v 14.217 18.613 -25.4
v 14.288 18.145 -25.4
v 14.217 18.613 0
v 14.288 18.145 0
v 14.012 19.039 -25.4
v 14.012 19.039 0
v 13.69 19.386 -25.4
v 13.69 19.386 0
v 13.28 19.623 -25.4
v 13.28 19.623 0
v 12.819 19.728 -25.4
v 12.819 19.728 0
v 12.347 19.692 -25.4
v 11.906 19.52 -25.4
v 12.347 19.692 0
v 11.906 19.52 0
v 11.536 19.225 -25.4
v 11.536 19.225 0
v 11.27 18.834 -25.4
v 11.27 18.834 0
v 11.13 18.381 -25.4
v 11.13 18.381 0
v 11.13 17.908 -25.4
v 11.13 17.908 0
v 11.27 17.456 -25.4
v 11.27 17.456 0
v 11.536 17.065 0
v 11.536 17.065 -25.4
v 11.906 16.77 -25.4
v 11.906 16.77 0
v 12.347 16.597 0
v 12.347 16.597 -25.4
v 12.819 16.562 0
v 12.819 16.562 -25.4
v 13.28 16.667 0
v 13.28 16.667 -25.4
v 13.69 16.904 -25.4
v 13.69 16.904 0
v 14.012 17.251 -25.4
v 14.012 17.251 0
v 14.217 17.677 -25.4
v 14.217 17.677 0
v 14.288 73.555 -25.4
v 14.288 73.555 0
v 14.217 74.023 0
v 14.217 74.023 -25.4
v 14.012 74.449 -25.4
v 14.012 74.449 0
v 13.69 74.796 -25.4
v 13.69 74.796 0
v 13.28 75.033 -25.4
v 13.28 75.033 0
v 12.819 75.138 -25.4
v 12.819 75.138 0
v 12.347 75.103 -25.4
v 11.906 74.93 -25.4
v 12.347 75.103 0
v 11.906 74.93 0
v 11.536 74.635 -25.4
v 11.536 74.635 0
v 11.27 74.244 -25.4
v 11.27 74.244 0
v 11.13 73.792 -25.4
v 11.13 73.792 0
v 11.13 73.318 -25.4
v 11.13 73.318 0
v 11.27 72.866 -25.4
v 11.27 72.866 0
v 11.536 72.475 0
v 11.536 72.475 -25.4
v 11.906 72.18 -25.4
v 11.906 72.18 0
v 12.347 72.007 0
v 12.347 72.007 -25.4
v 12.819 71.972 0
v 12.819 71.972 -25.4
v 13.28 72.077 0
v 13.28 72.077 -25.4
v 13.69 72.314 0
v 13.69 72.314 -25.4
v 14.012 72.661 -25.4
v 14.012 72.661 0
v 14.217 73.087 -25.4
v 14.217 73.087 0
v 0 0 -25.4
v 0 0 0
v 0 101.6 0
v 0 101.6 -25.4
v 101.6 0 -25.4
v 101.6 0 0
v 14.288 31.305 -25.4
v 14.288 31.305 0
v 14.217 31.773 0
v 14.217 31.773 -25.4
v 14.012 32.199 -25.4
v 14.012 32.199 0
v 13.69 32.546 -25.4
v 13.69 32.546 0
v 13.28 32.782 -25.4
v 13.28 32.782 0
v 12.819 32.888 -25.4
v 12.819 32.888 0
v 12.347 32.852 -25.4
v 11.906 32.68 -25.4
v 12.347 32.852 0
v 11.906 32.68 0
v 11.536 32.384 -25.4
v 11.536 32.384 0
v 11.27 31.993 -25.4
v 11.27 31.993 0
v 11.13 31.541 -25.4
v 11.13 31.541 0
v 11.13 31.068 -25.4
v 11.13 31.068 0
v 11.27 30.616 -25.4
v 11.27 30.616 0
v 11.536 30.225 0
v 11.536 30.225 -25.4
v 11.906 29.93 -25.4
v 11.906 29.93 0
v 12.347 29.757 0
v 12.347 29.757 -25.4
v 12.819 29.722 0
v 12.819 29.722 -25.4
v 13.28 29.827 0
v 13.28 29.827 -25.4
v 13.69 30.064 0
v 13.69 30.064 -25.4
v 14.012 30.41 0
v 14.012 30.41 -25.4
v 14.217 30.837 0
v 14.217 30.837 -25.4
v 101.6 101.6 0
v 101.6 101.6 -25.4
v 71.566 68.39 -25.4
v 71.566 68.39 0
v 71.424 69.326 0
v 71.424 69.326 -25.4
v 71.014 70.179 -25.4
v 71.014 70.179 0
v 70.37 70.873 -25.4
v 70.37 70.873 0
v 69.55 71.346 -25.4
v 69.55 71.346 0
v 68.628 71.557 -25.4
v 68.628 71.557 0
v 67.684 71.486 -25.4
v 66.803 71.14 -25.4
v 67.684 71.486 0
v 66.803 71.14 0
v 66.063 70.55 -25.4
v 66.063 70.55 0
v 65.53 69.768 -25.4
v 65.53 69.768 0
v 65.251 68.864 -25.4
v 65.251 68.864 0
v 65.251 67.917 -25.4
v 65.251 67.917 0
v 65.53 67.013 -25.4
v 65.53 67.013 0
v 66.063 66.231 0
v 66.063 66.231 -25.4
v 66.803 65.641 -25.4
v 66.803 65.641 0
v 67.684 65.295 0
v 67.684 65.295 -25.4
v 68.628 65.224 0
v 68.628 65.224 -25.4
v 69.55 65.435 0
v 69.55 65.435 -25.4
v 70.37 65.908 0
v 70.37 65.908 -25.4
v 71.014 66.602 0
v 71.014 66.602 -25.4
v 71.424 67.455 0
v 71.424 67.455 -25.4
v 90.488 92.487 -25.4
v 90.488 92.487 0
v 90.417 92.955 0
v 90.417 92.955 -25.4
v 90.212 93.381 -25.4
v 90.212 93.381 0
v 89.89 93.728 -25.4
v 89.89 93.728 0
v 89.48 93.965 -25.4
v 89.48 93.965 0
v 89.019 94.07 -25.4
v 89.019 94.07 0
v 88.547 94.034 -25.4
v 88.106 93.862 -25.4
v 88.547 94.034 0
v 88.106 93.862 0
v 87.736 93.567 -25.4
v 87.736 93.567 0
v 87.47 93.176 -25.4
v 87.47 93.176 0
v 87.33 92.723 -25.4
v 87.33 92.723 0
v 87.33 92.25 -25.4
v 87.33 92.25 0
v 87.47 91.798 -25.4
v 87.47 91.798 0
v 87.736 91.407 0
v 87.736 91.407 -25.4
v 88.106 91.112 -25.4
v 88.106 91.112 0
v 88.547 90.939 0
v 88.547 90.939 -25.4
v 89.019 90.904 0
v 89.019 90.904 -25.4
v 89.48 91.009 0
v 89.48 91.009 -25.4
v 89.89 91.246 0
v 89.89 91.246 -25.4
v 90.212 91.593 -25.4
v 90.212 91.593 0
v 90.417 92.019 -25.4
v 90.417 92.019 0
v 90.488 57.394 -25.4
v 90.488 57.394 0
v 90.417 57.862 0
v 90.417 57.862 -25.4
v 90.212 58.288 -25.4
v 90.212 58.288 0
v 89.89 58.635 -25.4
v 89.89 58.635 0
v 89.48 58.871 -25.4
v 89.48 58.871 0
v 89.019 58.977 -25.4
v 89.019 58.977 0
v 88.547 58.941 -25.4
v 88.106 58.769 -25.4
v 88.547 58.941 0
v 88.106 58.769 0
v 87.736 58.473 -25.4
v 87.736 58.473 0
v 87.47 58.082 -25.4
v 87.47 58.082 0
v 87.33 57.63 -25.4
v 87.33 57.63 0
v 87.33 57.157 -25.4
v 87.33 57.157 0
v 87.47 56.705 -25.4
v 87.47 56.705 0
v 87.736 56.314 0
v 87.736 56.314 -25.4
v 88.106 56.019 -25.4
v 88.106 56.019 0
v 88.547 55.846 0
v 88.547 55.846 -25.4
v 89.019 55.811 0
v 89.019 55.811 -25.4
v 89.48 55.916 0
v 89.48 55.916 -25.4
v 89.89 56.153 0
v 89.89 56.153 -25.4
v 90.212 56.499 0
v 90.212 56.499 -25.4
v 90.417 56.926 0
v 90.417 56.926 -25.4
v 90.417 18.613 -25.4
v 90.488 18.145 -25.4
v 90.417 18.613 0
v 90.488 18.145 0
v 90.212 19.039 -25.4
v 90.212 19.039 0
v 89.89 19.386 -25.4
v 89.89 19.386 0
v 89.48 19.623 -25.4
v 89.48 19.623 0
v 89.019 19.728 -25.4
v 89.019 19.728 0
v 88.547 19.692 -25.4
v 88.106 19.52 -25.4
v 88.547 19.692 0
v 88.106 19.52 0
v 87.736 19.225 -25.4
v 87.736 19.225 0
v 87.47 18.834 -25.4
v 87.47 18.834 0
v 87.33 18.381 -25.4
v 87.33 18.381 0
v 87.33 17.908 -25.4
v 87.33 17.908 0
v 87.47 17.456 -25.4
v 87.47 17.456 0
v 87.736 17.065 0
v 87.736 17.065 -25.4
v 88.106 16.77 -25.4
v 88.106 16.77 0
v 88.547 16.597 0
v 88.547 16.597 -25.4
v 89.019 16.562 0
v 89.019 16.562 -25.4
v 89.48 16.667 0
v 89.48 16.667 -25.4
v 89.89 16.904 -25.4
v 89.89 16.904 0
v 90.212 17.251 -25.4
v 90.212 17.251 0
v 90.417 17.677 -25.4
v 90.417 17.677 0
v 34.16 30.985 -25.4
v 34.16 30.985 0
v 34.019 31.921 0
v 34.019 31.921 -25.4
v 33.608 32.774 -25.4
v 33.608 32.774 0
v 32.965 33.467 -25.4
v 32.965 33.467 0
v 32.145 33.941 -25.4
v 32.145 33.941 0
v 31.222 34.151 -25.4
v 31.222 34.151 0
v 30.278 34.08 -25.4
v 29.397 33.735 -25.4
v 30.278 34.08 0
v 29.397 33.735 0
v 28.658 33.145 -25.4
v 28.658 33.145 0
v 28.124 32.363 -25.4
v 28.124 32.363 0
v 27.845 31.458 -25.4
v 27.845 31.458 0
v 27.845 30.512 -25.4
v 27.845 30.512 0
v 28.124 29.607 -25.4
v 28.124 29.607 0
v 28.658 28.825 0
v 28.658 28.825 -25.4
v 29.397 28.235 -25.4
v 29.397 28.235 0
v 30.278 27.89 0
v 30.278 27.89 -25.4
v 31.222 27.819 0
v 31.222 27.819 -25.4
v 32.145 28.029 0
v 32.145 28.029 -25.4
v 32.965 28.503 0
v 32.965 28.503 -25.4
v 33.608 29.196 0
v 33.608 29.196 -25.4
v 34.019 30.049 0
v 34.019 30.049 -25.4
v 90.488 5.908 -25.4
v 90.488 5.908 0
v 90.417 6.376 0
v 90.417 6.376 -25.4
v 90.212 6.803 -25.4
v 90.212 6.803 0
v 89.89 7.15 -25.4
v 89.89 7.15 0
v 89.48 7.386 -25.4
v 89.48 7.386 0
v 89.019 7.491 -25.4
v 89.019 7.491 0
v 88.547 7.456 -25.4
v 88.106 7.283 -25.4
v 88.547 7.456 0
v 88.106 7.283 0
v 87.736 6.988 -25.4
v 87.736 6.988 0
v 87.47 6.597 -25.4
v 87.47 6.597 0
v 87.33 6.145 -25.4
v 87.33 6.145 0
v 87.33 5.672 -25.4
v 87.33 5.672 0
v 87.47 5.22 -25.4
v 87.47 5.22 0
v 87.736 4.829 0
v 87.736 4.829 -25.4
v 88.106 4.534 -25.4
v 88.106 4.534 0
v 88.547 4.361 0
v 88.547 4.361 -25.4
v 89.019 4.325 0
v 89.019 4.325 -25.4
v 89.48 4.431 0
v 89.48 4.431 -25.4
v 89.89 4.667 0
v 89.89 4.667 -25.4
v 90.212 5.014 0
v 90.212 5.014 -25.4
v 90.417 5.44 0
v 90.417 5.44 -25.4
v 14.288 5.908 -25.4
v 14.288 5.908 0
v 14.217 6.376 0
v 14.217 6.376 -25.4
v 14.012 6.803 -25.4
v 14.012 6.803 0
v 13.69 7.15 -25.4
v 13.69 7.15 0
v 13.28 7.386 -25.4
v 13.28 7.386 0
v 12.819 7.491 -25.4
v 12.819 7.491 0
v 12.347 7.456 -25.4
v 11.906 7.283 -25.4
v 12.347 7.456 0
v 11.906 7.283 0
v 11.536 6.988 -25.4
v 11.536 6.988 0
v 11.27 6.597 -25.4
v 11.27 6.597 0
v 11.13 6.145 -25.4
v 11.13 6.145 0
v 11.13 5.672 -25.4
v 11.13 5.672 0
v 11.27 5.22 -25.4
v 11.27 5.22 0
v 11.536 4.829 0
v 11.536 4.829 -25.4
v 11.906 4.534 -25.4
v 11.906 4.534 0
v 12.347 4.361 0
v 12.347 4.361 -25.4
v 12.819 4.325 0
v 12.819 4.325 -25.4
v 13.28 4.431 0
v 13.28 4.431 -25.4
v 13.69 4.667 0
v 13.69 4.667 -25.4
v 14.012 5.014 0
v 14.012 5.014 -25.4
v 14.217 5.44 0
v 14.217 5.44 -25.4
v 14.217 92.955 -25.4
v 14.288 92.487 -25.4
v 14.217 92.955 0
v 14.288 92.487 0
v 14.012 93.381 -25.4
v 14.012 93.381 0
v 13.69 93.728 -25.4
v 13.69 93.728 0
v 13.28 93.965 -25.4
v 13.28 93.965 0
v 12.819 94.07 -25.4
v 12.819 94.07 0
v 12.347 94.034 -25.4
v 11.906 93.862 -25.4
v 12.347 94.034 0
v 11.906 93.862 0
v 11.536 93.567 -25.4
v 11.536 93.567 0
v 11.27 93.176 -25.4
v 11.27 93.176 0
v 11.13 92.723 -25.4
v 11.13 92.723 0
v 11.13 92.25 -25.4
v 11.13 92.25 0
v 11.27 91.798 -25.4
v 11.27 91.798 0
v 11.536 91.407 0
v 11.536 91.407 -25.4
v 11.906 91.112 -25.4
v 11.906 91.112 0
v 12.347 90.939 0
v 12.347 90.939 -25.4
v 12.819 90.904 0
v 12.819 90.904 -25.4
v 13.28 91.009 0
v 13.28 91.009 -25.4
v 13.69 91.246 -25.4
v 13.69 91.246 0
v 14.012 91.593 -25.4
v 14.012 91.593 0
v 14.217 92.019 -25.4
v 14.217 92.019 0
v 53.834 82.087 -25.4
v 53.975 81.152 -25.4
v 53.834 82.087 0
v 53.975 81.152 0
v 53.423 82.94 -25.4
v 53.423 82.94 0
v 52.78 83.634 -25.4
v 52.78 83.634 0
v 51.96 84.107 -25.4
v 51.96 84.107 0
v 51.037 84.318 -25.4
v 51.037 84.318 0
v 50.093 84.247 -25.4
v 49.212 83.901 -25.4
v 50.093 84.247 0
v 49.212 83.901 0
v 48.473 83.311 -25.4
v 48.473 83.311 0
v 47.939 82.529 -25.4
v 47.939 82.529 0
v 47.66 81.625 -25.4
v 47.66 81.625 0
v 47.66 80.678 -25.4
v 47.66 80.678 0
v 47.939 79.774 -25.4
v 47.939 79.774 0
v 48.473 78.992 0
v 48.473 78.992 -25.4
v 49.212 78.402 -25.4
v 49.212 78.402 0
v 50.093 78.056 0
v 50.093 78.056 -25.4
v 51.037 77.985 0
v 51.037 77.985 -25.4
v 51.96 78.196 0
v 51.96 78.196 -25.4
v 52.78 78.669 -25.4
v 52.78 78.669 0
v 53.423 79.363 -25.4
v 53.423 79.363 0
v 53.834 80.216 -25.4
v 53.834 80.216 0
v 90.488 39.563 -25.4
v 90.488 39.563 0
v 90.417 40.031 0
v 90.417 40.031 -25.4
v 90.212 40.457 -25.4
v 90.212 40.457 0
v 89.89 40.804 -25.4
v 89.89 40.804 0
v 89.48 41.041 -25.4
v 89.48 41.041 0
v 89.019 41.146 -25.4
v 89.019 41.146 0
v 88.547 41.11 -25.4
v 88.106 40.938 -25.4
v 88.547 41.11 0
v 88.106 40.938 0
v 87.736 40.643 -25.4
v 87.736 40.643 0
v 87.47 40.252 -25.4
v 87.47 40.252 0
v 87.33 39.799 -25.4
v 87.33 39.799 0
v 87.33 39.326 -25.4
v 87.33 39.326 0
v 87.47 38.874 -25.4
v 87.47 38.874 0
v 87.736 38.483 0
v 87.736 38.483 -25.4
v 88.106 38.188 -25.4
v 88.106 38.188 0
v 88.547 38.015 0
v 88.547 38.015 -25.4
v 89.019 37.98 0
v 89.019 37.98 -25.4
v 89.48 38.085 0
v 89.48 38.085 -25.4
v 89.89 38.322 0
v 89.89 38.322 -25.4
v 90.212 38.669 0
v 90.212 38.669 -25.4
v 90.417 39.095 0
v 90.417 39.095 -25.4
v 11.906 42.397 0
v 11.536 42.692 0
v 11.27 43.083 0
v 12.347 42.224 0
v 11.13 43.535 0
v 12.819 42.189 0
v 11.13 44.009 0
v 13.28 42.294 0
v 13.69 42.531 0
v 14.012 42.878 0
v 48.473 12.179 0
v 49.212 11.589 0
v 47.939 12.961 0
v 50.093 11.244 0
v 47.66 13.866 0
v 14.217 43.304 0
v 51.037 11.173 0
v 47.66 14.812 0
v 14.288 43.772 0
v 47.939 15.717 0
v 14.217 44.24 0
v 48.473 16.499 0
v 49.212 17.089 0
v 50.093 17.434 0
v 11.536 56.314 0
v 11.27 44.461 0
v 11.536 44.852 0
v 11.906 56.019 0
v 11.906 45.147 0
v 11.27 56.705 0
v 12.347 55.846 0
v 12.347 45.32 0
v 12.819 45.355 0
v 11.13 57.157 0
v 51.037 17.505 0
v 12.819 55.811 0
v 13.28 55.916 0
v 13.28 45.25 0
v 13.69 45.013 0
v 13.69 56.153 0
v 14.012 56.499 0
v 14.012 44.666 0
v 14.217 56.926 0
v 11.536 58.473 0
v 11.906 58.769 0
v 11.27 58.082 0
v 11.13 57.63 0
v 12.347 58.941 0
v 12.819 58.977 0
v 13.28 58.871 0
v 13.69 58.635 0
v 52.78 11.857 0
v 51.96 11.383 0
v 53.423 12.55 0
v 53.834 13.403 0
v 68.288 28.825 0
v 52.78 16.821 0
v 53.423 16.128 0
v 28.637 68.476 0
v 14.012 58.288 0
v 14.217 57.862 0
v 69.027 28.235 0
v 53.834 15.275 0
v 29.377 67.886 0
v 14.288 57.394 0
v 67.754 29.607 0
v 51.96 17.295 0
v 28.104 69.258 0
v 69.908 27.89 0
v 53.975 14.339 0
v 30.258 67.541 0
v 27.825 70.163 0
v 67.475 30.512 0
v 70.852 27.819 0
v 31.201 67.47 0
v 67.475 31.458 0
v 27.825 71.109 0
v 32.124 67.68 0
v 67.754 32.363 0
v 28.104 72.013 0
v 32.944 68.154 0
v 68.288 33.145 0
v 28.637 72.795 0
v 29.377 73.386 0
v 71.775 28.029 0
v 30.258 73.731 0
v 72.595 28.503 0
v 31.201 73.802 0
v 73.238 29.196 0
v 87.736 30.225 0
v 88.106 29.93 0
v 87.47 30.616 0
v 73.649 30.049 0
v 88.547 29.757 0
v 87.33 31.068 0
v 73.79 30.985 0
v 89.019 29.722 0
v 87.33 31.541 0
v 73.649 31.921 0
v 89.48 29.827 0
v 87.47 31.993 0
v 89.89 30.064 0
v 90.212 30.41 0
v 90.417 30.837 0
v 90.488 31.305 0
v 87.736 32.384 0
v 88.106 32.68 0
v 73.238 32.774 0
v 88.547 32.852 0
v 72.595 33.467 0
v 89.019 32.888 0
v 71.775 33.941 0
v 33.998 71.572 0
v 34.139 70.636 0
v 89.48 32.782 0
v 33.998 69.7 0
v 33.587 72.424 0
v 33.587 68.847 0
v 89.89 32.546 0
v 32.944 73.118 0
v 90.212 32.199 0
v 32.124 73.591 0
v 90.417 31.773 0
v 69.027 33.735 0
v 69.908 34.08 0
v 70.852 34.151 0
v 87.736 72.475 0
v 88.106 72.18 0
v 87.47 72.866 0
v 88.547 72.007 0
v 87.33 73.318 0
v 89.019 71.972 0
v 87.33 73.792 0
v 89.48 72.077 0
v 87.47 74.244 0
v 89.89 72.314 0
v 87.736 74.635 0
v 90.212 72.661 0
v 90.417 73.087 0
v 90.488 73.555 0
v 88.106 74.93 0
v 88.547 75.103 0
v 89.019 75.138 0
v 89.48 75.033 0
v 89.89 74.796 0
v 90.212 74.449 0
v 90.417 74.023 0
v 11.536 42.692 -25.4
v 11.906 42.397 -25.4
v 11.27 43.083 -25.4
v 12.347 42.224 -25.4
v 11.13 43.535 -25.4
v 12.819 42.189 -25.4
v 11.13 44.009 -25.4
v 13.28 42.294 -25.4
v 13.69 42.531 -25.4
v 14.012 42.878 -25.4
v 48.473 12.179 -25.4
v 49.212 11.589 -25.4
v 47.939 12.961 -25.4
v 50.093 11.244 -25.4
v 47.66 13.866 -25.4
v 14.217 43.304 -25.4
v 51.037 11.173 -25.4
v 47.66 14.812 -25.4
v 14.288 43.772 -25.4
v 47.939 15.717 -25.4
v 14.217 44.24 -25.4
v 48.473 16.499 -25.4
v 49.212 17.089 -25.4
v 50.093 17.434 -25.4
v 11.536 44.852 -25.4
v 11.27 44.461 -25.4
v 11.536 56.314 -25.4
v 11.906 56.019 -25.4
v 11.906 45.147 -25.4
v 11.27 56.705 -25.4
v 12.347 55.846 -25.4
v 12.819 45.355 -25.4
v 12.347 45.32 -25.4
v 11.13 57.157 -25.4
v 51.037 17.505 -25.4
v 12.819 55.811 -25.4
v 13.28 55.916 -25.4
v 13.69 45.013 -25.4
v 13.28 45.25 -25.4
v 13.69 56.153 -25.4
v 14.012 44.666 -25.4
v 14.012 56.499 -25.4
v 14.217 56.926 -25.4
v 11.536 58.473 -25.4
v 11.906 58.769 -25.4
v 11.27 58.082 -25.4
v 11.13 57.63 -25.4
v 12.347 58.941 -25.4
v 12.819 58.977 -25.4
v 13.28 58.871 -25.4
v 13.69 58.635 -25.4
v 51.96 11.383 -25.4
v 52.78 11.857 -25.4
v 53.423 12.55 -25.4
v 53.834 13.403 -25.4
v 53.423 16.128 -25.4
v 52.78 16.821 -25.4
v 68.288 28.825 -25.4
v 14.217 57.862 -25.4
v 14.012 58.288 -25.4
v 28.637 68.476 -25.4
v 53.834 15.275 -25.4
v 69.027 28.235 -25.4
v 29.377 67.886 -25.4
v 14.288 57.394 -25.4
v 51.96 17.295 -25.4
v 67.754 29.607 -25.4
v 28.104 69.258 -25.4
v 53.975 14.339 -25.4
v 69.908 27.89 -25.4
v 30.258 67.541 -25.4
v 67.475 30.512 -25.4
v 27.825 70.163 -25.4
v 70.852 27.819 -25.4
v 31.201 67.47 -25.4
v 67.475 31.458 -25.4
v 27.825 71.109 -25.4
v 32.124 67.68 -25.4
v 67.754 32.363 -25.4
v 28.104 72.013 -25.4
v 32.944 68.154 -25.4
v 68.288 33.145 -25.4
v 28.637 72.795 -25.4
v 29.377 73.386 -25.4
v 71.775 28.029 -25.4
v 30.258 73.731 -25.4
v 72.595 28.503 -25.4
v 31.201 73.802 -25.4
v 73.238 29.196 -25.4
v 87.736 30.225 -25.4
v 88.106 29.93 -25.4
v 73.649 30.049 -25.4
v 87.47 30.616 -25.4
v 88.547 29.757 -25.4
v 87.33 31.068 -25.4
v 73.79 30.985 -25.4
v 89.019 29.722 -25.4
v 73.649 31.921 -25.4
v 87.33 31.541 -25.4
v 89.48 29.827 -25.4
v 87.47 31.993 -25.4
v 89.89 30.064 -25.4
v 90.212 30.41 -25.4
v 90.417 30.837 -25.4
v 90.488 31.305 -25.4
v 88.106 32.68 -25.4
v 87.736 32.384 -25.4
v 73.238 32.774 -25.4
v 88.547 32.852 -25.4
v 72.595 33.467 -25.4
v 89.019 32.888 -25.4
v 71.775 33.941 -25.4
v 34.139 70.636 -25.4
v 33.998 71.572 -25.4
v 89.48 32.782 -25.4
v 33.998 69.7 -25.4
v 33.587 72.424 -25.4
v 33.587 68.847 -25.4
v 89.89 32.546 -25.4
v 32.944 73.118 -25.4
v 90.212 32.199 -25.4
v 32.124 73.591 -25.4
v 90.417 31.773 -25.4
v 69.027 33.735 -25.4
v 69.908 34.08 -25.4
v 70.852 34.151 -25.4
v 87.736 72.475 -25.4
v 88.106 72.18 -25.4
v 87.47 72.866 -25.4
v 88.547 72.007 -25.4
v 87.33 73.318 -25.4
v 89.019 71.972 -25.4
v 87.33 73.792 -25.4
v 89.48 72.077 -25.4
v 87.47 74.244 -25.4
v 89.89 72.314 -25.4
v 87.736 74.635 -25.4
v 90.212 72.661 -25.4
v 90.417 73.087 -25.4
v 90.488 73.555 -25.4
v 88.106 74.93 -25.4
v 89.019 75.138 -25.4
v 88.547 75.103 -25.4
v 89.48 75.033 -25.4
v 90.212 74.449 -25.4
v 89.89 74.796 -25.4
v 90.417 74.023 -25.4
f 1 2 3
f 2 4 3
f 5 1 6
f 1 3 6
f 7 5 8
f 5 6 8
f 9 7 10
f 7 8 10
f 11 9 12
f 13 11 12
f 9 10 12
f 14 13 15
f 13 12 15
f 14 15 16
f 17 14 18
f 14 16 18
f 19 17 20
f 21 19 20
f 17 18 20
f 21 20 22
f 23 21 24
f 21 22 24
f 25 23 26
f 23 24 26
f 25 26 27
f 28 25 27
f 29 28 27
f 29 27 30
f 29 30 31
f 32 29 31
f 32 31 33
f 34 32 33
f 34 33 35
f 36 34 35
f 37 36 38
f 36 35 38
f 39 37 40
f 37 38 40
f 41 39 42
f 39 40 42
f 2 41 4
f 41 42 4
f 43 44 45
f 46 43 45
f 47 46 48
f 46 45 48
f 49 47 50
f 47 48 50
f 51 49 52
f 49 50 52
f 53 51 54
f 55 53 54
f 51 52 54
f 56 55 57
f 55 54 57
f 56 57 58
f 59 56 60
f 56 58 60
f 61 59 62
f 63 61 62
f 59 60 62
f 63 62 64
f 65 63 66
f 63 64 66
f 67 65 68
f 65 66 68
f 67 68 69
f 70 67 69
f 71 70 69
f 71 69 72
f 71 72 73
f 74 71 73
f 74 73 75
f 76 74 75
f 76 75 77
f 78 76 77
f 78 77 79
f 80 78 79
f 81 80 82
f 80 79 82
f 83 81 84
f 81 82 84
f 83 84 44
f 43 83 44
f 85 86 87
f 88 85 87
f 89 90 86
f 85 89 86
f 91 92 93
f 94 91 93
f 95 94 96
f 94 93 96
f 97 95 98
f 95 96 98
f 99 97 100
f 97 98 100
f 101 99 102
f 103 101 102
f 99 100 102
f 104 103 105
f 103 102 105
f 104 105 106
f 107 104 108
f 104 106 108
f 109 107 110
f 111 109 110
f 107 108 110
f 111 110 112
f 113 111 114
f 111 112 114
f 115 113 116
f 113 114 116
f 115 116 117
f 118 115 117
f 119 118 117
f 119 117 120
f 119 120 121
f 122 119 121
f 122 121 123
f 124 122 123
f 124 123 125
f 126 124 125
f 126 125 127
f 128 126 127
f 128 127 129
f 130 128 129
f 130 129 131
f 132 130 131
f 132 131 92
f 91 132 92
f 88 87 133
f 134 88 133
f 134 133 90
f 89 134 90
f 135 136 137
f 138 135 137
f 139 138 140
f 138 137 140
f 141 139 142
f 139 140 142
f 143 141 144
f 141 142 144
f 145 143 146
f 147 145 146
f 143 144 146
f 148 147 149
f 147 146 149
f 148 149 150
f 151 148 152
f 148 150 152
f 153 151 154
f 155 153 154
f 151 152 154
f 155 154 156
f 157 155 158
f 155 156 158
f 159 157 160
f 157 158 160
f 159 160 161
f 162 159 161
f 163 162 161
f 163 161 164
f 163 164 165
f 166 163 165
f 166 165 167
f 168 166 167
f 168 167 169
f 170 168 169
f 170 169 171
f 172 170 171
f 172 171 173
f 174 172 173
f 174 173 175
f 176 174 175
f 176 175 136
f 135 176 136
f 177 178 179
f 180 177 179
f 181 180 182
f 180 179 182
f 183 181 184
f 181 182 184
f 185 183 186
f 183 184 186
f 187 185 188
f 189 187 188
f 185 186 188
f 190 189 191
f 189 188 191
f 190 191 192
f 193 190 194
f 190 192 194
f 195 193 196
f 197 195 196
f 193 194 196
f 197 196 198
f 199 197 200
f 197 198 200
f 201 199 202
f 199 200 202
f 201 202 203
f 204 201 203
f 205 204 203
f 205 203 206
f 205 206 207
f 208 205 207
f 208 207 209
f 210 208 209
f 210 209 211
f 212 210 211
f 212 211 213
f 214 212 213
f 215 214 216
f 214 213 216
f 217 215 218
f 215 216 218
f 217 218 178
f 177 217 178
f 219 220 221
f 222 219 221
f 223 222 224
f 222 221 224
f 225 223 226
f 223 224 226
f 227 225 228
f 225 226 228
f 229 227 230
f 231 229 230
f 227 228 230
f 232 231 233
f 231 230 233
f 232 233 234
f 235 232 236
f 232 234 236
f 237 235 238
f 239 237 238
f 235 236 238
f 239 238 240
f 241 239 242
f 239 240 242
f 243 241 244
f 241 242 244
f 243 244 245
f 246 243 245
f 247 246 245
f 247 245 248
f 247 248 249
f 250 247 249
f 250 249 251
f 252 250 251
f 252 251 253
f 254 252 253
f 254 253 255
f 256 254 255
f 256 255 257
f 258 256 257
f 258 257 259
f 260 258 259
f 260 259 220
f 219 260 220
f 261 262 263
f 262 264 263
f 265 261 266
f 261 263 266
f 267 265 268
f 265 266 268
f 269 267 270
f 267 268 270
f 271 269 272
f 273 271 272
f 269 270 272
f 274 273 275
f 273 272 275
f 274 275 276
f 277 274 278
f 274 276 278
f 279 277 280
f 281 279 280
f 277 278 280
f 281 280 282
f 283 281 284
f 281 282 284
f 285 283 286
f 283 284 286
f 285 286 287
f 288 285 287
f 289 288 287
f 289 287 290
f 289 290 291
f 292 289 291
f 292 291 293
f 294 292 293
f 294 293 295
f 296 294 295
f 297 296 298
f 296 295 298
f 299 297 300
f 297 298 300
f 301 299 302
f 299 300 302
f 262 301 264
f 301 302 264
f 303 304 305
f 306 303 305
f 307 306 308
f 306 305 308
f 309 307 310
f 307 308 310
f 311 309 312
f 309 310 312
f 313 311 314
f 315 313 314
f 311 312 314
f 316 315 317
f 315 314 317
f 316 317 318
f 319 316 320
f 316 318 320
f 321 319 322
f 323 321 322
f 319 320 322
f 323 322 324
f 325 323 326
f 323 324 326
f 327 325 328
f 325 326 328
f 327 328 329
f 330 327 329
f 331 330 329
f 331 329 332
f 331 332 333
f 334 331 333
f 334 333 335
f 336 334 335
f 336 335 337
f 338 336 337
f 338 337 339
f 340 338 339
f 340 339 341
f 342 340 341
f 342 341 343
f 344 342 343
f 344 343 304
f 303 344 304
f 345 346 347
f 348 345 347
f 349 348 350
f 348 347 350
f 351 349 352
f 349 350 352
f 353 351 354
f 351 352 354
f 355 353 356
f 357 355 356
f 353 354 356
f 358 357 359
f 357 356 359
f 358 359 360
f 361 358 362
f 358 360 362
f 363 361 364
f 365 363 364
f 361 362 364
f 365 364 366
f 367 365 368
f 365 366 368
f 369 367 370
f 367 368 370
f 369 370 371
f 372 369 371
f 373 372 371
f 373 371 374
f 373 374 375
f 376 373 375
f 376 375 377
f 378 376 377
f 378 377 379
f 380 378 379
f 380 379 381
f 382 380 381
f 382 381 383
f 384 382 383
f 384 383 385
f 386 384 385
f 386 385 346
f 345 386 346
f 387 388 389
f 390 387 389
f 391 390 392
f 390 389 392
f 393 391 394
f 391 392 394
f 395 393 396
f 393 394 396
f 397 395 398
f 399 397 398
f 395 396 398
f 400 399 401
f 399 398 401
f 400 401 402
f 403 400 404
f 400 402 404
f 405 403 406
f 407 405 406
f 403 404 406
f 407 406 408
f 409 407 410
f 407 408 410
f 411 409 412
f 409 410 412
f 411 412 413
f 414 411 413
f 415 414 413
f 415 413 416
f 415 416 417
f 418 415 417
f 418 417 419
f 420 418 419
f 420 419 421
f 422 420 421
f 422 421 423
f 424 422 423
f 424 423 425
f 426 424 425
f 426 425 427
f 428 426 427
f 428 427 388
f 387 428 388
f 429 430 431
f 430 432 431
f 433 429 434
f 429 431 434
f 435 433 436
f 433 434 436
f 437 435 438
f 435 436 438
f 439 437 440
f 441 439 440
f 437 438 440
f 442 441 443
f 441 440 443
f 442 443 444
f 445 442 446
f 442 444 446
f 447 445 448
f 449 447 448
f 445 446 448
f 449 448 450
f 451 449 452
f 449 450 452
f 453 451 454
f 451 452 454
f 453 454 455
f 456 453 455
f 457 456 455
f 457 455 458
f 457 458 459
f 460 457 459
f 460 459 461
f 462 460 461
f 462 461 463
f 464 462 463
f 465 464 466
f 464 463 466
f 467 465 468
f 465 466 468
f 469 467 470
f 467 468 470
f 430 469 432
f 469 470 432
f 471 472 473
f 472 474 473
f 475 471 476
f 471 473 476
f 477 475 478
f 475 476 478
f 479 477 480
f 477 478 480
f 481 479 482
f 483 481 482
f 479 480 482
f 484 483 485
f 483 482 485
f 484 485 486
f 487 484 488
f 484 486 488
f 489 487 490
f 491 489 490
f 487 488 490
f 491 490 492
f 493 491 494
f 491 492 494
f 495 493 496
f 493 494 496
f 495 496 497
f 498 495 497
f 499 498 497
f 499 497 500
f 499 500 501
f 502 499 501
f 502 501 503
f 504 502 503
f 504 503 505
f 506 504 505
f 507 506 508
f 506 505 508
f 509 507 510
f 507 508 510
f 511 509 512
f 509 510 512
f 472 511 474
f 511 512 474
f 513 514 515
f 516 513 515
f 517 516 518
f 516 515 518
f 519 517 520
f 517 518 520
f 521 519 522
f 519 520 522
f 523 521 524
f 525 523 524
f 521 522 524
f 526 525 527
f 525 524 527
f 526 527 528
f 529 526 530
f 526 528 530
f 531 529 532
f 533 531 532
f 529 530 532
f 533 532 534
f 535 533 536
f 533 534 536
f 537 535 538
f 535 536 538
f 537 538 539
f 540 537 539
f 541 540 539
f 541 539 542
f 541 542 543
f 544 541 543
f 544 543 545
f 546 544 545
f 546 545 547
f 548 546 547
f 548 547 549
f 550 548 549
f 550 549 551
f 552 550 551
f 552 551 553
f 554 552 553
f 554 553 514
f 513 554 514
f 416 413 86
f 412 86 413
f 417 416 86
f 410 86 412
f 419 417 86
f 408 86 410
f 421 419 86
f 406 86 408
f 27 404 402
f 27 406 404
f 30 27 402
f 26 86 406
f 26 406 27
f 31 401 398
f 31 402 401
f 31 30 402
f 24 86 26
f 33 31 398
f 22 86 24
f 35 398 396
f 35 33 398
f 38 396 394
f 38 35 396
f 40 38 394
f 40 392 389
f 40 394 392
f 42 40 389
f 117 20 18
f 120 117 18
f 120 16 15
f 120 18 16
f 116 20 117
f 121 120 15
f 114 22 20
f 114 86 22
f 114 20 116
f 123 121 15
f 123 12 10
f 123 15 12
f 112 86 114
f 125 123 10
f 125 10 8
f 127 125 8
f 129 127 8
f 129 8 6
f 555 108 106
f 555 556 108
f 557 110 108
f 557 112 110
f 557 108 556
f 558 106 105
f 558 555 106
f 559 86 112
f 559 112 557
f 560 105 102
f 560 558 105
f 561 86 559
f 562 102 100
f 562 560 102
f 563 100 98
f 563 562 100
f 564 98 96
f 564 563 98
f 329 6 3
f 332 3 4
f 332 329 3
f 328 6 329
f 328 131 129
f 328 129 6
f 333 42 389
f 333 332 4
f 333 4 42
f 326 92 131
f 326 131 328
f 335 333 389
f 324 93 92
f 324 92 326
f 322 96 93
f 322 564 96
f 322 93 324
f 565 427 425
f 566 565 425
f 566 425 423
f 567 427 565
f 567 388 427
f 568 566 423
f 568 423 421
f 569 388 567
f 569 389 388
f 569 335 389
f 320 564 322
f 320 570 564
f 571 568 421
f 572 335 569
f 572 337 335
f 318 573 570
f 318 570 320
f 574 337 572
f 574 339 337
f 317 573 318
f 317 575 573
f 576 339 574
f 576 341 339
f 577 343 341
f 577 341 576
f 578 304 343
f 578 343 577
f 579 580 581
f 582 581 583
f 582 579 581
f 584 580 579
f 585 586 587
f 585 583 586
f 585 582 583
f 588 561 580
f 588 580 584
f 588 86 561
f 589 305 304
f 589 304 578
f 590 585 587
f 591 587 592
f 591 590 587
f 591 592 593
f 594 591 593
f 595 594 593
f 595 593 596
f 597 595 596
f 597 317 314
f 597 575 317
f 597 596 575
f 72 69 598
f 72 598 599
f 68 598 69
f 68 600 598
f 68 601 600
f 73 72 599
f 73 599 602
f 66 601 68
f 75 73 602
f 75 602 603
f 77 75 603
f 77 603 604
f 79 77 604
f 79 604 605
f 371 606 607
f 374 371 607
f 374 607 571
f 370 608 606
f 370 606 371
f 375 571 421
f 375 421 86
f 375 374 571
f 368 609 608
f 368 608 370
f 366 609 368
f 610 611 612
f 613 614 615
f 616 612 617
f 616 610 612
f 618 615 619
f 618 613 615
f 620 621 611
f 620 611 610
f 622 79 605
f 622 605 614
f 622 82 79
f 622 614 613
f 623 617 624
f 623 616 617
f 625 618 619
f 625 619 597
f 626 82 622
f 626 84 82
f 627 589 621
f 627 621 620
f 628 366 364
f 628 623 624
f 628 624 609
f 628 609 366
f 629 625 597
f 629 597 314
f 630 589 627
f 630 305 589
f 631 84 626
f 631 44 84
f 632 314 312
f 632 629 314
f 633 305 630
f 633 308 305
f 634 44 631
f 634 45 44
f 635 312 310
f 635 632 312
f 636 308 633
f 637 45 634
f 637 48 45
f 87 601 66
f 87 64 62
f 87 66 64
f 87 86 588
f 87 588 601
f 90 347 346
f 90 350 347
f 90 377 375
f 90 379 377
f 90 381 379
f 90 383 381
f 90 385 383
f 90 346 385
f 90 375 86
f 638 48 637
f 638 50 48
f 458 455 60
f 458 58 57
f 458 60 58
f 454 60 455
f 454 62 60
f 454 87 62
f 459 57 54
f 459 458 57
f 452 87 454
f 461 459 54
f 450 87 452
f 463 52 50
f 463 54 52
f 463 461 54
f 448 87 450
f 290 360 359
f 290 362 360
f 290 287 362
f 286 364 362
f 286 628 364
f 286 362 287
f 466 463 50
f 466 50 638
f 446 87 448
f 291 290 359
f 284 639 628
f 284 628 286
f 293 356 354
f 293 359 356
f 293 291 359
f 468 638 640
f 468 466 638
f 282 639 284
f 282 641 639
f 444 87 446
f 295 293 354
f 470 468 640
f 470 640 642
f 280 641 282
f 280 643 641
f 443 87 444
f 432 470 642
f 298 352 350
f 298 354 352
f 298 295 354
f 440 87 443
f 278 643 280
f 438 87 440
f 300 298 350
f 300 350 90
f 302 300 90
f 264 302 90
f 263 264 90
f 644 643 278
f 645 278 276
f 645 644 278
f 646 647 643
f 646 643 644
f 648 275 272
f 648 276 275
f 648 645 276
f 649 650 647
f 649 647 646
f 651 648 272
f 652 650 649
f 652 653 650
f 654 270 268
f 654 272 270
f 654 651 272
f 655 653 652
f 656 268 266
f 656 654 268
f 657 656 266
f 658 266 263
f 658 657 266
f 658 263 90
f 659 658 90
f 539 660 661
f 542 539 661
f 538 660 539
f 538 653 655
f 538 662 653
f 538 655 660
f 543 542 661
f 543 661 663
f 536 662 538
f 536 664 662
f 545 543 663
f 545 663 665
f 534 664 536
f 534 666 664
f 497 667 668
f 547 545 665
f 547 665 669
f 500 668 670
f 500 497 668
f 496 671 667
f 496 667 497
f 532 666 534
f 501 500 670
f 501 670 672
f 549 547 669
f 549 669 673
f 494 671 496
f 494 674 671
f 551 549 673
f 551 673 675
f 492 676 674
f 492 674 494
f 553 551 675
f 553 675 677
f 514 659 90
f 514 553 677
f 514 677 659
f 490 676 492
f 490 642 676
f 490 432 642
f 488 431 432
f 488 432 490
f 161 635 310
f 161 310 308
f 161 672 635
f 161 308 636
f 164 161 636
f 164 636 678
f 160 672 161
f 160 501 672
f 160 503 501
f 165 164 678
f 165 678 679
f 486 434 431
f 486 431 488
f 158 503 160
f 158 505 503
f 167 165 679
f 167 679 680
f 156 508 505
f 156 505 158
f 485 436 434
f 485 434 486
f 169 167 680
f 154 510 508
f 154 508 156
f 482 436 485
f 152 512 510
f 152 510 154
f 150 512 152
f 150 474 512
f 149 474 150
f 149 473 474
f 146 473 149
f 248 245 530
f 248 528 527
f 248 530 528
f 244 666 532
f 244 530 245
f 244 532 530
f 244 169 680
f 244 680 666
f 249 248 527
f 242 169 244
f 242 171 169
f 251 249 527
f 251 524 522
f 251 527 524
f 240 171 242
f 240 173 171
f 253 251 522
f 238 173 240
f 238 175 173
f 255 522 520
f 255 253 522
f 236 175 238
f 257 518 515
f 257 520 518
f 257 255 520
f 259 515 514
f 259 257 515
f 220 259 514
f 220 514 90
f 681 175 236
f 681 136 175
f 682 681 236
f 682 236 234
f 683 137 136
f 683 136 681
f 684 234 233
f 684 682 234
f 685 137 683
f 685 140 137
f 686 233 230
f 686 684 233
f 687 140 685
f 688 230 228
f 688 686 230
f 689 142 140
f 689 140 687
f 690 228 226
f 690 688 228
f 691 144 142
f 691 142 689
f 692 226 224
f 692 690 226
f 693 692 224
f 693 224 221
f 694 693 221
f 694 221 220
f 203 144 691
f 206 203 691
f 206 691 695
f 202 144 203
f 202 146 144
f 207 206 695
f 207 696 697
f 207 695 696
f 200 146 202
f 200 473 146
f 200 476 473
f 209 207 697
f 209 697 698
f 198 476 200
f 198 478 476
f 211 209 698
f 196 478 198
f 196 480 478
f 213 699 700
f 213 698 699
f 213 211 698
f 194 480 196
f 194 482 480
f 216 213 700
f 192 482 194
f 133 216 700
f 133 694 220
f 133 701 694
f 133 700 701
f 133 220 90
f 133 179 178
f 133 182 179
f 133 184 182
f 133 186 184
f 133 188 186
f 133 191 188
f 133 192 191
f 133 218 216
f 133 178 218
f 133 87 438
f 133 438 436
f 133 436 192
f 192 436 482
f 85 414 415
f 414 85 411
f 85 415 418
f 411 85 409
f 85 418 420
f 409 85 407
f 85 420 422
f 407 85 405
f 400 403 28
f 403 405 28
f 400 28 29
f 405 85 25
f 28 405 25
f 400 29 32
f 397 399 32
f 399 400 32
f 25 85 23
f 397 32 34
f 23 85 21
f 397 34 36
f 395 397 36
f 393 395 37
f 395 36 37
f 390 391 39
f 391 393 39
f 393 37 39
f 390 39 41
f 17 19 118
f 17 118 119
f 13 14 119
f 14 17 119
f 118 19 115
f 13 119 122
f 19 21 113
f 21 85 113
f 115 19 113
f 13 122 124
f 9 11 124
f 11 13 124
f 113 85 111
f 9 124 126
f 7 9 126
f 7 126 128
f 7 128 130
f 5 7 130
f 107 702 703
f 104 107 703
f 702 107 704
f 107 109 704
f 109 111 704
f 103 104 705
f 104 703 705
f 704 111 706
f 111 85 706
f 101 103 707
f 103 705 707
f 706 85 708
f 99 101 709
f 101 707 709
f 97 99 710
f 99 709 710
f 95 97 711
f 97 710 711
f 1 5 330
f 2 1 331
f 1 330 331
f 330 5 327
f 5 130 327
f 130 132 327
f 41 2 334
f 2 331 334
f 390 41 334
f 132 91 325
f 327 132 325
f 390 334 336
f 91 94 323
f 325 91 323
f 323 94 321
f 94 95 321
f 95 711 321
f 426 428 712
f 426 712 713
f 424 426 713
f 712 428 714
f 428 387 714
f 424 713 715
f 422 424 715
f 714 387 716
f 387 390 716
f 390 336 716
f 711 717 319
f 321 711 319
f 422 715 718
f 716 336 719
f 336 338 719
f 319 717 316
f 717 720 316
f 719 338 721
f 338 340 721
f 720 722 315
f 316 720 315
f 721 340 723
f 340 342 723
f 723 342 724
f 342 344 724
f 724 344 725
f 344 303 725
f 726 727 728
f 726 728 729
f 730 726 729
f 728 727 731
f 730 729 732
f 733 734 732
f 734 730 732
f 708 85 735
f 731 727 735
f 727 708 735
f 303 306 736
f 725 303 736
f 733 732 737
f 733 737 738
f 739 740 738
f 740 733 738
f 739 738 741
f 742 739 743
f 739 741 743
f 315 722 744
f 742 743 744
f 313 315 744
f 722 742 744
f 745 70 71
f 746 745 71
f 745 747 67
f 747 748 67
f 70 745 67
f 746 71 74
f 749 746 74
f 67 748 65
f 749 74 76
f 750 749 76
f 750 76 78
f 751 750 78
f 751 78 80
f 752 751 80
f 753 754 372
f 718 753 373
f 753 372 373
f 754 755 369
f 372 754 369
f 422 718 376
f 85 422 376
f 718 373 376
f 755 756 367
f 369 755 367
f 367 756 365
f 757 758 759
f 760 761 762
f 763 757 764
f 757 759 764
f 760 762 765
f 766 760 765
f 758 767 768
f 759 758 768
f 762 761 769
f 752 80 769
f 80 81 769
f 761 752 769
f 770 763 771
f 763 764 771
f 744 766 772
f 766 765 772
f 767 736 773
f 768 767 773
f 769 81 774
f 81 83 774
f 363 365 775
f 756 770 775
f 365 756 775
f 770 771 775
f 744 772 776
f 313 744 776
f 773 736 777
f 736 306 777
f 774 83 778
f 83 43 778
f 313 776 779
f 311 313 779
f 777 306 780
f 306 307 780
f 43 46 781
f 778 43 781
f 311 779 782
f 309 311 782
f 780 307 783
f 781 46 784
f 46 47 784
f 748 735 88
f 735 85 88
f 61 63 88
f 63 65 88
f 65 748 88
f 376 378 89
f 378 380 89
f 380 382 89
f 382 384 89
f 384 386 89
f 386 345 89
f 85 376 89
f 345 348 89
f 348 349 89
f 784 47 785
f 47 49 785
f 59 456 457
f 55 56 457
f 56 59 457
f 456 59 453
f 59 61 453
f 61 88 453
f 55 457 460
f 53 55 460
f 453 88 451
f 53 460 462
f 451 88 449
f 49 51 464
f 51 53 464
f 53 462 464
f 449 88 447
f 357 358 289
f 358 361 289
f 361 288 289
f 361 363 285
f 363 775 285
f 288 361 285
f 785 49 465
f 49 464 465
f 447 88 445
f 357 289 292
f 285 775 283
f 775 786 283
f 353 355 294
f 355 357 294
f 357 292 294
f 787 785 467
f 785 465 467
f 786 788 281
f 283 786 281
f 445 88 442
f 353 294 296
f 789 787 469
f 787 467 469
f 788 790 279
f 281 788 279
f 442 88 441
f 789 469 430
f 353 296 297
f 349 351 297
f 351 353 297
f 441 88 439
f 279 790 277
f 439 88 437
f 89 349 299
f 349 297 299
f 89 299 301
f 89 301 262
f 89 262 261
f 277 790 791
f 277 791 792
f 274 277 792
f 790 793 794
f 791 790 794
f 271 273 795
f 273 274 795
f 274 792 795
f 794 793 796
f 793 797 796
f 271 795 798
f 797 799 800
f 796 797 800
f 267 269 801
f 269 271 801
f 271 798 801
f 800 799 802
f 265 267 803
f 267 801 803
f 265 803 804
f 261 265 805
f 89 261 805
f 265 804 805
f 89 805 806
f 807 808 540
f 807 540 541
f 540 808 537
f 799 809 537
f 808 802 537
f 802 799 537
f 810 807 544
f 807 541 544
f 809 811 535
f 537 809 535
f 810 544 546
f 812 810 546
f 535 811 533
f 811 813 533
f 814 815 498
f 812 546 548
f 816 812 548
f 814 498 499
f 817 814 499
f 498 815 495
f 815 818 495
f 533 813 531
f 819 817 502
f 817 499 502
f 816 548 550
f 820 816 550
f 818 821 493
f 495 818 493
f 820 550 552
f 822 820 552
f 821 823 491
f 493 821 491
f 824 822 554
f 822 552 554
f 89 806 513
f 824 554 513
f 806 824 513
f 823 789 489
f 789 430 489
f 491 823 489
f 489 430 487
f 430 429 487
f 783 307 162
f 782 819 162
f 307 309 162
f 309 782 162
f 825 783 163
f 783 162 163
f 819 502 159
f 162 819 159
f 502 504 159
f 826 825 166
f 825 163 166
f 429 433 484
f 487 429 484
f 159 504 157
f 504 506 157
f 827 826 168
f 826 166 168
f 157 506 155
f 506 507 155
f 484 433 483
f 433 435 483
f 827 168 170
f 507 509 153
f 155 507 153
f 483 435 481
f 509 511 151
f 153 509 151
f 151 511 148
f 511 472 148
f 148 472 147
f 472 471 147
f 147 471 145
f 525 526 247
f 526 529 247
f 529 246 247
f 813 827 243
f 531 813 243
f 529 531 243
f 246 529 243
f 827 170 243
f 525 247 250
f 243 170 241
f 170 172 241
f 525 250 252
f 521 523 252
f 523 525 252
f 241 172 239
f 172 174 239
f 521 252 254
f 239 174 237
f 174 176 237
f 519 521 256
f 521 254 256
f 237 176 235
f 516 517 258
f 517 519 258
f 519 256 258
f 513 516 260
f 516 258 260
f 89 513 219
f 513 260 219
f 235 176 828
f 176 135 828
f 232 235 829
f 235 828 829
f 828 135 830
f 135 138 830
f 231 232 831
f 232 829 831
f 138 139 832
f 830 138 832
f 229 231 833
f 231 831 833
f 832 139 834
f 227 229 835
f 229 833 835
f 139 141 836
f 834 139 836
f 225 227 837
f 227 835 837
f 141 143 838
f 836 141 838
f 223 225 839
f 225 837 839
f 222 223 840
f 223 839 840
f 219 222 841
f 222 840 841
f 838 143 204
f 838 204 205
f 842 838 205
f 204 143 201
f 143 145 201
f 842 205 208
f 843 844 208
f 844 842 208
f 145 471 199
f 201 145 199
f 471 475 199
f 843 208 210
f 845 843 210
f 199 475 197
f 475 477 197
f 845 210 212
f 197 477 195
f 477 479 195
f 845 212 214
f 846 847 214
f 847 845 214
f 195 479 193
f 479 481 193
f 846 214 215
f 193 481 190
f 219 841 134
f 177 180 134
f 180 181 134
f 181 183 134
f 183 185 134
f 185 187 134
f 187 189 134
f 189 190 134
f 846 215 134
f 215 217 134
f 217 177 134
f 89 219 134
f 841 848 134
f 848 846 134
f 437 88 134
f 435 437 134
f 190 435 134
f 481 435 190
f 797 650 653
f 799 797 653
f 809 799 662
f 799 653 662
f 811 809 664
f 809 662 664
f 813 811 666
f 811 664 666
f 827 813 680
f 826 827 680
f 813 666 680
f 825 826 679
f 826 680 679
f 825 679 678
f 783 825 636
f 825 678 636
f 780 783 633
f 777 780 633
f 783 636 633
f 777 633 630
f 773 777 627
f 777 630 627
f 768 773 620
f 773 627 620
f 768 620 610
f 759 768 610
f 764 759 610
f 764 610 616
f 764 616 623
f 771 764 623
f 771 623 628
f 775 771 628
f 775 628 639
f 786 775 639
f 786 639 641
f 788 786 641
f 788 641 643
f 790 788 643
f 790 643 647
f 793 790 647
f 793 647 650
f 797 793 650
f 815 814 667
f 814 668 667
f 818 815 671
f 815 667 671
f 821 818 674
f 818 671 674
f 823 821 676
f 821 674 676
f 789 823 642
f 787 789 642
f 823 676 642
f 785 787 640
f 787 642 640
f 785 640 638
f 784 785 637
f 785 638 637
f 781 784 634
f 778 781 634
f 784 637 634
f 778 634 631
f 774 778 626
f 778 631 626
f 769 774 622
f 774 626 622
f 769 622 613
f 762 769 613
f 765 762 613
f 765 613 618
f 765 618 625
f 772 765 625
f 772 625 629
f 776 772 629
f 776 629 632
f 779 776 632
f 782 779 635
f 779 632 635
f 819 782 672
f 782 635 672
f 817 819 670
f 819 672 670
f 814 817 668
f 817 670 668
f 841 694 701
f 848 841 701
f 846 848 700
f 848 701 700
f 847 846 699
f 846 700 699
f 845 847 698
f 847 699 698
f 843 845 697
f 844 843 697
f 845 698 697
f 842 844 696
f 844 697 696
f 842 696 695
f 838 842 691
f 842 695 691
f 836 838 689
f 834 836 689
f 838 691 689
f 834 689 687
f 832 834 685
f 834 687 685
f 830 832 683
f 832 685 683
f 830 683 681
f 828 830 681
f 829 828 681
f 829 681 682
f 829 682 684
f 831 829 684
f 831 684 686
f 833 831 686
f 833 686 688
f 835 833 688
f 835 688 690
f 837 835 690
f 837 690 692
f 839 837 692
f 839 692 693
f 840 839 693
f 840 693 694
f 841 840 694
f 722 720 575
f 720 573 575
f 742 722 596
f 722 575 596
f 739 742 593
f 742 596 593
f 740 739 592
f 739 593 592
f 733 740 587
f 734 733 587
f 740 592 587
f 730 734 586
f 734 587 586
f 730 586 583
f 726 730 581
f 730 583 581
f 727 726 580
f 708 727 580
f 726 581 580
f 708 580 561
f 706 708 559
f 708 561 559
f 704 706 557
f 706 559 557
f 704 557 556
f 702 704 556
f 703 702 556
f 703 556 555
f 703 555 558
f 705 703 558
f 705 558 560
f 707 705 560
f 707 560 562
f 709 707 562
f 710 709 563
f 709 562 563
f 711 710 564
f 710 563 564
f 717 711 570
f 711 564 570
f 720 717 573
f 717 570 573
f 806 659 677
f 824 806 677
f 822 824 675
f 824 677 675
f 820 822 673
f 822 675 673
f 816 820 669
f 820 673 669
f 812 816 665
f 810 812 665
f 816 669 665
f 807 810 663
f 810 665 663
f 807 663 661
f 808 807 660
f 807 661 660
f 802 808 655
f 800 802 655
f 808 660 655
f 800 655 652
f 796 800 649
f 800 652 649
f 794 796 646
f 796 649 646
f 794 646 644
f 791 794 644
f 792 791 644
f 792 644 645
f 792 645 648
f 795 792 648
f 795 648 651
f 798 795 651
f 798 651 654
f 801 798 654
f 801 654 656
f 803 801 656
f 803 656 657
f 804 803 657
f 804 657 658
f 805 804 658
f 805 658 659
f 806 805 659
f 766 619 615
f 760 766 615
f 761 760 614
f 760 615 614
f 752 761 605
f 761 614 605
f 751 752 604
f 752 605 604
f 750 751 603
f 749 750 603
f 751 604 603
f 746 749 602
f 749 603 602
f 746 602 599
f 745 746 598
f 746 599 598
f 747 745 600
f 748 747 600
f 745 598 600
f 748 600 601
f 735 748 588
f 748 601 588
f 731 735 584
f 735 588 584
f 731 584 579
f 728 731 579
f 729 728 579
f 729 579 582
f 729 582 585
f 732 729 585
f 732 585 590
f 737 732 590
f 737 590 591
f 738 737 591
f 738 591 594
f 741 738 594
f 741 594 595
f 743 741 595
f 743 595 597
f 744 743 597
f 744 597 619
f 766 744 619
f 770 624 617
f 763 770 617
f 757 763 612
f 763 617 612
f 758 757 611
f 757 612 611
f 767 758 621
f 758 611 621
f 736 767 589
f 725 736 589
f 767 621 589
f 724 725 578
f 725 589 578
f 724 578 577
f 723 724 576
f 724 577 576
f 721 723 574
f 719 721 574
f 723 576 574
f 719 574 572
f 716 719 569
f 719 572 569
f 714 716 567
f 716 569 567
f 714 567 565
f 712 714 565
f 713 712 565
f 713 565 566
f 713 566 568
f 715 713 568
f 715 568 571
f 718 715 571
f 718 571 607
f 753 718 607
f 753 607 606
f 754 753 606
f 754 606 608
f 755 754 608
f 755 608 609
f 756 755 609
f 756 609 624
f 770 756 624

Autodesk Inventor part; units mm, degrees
ref_plane "YZ Plane" through (0, 0, 0) normal (1, 0, 0) x (0, 1, 0)
ref_plane "XZ Plane" through (0, 0, 0) normal (0, 1, 0) x (-1, 0, 0)
ref_plane "XY Plane" through (0, 0, 0) normal (0, 0, 1) x (1, 0, 0)
sketch "Sketch1" plane through (0, 0, 0) normal (0, 0, 1) x (1, 0, 0)
  line L0 (0, 0) -> (0, 101.6)
  line L1 (0, 101.6) -> (101.6, 101.6)
  line L2 (101.6, 101.6) -> (101.6, 0)
  line L3 (101.6, 0) -> (0, 0)
  circle A0 centre (12.7, 92.4868) radius 1.5875
  circle A1 centre (12.7, 73.555) radius 1.5875
  circle A2 centre (12.7, 57.3937) radius 1.5875
  circle A3 centre (12.7, 43.772) radius 1.5875
  circle A4 centre (12.7, 31.3047) radius 1.5875
  circle A5 centre (12.7, 18.1448) radius 1.5875
  circle A6 centre (12.7, 5.9084) radius 1.5875
  circle A7 centre (88.9, 92.4868) radius 1.5875
  circle A8 centre (88.9, 73.555) radius 1.5875
  circle A9 centre (88.9, 57.3937) radius 1.5875
  circle A10 centre (88.9, 39.5628) radius 1.5875
  circle A11 centre (88.9, 31.3047) radius 1.5875
  circle A12 centre (88.9, 18.1448) radius 1.5875
  circle A13 centre (88.9, 5.9084) radius 1.5875
  circle A14 centre (50.8, 81.1516) radius 3.175
  circle A15 centre (30.9641, 70.6359) radius 3.175
  circle A16 centre (30.985, 30.985) radius 3.175
  circle A17 centre (50.8, 14.339) radius 3.175
  circle A18 centre (70.615, 30.985) radius 3.175
  circle A19 centre (68.3905, 68.3905) radius 3.175
  line L4 (0, 101.6) -> (101.6, 0) construction
  line L5 (0, 0) -> (101.6, 101.6) construction
  line L6 (0, 50.8) -> (101.6, 50.8) construction
  line L7 (50.8, 50.8) -> (50.8, 101.6) construction
  line L8 (50.8, 50.8) -> (50.8, 0) construction
  dimension "d0" = 101.6
  dimension "d1" = 101.6
  dimension "d2" = 3.175
  dimension "d3" = 3.175
  dimension "d4" = 3.175
  dimension "d5" = 3.175
  dimension "d6" = 3.175
  dimension "d7" = 3.175
  dimension "d8" = 3.175
  dimension "d9" = 12.7
  dimension "d10" = 12.7
  dimension "d11" = 12.7
  dimension "d12" = 12.7
  dimension "d13" = 12.7
  dimension "d14" = 12.7
  dimension "d15" = 12.7
  dimension "d18" = 3.175
  dimension "d19" = 3.175
  dimension "d20" = 3.175
  dimension "d21" = 3.175
  dimension "d22" = 3.175
  dimension "d23" = 3.175
  dimension "d24" = 3.175
  dimension "d25" = 12.7
  dimension "d26" = 12.7
  dimension "d27" = 12.7
  dimension "d28" = 12.7
  dimension "d29" = 12.7
  dimension "d30" = 12.7
  dimension "d31" = 12.7
  dimension "d58" = 6.35
  dimension "d59" = 6.35
  dimension "d60" = 6.35
  dimension "d61" = 6.35
  dimension "d62" = 6.35
  dimension "d63" = 6.35
extrude "Extrusion1" add sketch "Sketch1" against normal blind 25.4 contours L0 L1 L2 L3 | A7 | A8 | A9 | A10 | A11 | A12 | A13 | A14 | A15 | A16 | A17 | A18 | A19
extrude "Extrusion2" cut sketch "Sketch1" against normal blind 25.4 contours A7
extrude "Extrusion3" cut sketch "Sketch1" against normal blind 25.4 contours A8
extrude "Extrusion4" cut sketch "Sketch1" against normal blind 25.4 contours A9
extrude "Extrusion5" cut sketch "Sketch1" against normal blind 25.4 contours A10
extrude "Extrusion6" cut sketch "Sketch1" against normal blind 25.4 contours A11
extrude "Extrusion7" cut sketch "Sketch1" against normal blind 25.4 contours A12
extrude "Extrusion8" cut sketch "Sketch1" against normal blind 25.4 contours A13
extrude "Extrusion9" cut sketch "Sketch1" against normal blind 25.4 contours A15
extrude "Extrusion10" cut sketch "Sketch1" against normal blind 25.4 contours A16
extrude "Extrusion11" cut sketch "Sketch1" against normal blind 25.4 contours A14
extrude "Extrusion12" cut sketch "Sketch1" against normal blind 25.4 contours A19
extrude "Extrusion13" cut sketch "Sketch1" against normal blind 25.4 contours A18
extrude "Extrusion14" cut sketch "Sketch1" against normal blind 25.4 contours A17
properties part number "PopQuiz"
